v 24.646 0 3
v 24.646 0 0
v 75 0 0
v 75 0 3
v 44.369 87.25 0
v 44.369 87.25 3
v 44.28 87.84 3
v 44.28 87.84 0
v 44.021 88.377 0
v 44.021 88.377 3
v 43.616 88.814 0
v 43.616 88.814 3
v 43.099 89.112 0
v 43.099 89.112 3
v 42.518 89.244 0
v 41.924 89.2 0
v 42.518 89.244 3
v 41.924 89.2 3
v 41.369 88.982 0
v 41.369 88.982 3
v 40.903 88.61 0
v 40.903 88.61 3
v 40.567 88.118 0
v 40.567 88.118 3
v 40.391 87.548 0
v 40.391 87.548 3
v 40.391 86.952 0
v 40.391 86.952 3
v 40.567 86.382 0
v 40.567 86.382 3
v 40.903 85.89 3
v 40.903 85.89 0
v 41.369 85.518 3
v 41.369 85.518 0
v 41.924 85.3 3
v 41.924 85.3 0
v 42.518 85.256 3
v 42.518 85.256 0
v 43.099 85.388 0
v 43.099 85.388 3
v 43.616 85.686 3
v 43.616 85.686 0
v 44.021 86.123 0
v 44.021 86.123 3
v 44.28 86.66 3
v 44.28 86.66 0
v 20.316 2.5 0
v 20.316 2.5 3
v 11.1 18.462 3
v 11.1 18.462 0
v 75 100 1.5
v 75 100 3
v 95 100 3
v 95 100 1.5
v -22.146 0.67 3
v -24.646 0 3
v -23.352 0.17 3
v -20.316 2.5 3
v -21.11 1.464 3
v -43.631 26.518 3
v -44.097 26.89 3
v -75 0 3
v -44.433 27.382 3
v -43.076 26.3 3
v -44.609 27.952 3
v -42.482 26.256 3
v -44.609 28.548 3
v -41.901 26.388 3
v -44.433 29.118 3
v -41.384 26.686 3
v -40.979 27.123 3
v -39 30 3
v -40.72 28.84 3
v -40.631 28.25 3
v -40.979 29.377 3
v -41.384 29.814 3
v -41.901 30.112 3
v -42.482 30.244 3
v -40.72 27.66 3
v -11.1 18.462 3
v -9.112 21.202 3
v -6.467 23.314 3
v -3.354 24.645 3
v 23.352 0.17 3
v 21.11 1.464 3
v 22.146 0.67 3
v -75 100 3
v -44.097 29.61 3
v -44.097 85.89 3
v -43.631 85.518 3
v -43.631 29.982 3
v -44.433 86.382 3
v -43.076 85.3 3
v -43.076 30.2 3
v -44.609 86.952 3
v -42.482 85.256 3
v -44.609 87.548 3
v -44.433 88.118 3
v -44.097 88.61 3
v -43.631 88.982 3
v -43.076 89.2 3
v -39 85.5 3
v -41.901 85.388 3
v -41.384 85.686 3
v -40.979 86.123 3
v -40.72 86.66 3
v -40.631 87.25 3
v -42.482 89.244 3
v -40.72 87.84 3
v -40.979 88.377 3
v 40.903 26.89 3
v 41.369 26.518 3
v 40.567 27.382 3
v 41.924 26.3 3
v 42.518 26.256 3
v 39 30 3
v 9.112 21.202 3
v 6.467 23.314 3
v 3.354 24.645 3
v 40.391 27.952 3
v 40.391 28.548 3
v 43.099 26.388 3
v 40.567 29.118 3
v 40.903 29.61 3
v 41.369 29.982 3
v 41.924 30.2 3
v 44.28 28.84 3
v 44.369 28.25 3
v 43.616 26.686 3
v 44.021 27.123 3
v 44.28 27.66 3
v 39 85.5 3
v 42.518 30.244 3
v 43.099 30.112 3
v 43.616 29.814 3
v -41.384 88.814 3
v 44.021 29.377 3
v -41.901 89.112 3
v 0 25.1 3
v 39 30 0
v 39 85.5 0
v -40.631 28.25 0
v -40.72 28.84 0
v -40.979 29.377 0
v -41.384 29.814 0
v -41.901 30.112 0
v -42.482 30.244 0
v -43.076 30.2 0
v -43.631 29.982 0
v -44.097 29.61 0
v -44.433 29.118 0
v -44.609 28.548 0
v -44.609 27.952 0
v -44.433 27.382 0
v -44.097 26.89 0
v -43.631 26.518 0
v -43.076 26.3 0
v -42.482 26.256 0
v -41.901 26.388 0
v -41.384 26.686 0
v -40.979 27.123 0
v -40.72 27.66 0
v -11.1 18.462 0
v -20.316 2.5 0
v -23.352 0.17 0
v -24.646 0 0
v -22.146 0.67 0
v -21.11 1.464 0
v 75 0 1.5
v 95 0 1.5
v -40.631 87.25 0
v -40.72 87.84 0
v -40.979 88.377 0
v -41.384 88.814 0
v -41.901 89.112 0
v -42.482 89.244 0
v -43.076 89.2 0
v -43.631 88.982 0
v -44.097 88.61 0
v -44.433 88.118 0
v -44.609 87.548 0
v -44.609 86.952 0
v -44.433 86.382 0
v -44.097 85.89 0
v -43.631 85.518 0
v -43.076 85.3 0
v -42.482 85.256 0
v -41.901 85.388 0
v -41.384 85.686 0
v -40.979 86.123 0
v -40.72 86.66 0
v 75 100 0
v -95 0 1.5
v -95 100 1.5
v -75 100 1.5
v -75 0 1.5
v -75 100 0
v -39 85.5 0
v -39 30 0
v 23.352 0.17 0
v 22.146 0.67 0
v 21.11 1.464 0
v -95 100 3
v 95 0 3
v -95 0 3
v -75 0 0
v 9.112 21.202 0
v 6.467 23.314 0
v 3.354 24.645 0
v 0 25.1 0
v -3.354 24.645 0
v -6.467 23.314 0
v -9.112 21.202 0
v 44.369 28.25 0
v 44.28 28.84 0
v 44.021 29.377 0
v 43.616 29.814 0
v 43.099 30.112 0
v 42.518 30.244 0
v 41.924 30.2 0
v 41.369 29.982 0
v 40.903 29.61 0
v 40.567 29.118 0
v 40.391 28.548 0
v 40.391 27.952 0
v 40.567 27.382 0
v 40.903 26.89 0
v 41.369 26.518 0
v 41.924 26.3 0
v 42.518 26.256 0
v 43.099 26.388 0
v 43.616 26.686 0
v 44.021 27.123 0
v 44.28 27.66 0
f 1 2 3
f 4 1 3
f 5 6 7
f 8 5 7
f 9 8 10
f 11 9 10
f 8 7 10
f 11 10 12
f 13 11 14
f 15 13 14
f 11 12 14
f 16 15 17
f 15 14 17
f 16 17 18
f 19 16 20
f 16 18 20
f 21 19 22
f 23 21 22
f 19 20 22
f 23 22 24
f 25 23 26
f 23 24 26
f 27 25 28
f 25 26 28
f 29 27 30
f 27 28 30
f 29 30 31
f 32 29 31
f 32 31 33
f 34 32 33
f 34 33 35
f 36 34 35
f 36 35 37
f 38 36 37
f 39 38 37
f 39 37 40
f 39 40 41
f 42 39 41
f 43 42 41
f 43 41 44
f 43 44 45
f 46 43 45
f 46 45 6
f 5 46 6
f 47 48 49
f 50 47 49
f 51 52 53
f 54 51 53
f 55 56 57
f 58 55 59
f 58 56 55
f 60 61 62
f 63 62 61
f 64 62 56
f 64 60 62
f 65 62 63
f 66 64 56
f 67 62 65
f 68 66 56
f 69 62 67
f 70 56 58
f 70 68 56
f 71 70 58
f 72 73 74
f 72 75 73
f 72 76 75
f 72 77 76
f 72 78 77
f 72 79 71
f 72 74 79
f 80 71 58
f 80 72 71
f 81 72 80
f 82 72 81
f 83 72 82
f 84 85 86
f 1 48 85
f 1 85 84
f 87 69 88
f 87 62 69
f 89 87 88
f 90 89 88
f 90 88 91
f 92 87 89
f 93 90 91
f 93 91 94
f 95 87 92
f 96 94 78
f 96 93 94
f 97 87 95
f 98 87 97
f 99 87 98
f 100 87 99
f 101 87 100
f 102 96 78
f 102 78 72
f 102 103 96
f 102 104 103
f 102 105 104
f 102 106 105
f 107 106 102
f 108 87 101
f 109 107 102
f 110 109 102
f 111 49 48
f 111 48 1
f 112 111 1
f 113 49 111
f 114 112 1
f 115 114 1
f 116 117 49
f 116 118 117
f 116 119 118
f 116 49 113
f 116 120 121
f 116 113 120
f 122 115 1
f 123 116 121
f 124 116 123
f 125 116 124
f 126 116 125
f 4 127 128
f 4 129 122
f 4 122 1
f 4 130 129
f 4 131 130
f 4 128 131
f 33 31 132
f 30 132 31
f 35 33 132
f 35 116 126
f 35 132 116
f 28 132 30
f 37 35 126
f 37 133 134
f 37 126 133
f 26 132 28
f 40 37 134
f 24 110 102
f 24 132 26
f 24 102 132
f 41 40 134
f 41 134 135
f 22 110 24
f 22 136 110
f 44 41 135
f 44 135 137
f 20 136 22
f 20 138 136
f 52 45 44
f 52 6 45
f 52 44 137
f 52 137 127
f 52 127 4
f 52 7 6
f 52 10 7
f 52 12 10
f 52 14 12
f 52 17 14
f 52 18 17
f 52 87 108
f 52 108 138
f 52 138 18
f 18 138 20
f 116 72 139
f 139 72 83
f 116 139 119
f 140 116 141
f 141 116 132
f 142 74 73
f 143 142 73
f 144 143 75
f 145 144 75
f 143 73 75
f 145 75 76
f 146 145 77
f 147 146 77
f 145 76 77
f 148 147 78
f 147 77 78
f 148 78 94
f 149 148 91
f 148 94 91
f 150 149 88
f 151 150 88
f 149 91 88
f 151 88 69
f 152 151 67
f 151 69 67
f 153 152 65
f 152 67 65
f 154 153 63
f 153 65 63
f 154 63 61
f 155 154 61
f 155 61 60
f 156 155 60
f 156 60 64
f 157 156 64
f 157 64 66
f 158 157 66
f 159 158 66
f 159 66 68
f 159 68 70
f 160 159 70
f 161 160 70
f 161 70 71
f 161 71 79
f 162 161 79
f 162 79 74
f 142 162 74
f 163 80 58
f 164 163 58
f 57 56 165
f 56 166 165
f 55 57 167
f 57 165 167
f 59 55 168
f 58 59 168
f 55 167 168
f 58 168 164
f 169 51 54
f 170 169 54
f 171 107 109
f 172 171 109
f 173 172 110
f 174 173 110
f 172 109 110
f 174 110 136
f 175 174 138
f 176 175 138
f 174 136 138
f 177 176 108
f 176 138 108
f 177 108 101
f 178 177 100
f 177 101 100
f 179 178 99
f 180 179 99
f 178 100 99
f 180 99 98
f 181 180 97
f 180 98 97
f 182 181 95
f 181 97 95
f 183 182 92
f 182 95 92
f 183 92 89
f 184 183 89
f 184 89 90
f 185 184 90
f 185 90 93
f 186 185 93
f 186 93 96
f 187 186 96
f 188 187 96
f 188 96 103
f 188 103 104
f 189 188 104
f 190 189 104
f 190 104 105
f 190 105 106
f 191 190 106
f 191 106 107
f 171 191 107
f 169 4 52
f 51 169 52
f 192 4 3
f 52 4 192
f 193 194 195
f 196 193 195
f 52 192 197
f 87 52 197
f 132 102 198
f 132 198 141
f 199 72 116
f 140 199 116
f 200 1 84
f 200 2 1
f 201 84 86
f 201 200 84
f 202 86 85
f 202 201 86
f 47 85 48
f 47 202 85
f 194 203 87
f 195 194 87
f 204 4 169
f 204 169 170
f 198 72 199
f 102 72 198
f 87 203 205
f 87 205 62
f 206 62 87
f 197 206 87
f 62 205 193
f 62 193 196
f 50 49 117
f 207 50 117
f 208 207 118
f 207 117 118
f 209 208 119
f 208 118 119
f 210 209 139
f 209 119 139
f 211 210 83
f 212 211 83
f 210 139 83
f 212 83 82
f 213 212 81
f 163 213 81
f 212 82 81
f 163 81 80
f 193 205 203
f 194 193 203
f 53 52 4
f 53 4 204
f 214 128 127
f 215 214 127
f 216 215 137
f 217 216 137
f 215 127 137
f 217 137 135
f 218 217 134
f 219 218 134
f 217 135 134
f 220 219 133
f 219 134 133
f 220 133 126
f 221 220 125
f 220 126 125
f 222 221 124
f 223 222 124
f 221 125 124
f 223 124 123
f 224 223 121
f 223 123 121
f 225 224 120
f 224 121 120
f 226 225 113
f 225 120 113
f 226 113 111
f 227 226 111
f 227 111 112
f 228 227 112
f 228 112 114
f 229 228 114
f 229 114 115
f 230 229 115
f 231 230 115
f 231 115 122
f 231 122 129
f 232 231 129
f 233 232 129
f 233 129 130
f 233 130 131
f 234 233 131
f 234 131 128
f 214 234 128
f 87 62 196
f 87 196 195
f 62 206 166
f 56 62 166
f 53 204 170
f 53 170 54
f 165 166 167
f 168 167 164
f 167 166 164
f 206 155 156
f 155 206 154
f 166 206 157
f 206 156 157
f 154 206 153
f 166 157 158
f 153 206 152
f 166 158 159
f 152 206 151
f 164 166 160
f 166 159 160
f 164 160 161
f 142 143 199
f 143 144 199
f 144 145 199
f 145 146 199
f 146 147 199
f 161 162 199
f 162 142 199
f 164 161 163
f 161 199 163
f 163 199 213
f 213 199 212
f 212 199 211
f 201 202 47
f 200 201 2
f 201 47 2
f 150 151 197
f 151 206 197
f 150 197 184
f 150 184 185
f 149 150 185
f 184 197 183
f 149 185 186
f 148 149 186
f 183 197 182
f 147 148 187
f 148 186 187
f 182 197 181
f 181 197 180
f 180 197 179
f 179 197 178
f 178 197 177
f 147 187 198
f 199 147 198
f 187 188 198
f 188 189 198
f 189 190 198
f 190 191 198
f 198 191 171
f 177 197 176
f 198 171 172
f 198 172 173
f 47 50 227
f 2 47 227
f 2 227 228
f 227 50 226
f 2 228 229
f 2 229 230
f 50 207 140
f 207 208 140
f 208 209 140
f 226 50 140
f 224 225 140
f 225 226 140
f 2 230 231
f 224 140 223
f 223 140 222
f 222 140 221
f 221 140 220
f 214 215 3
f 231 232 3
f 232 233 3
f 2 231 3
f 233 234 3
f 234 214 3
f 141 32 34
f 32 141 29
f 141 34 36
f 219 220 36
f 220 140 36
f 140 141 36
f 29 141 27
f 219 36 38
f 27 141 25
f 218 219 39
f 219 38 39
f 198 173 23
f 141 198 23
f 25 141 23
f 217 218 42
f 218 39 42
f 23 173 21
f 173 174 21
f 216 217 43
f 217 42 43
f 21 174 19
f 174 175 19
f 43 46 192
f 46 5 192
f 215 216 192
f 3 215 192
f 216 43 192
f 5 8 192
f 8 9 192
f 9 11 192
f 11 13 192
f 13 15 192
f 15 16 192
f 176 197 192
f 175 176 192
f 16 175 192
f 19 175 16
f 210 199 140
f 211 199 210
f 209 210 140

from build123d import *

# Parameters (mm, degrees)
F1_DEPTH  = 3
F3_DEPTH  = 25
F4_R      = 5
F5_R      = 11.15
F5_R_2    = 2.65
F6_DEPTH  = 25
F7_W      = 78
F7_H      = 55.5
F7_R      = 2
F8_DEPTH  = 25
F9_R      = 8.15
F10_DEPTH = 25
F12_W     = 138.9529037597
F12_H     = 109.3872413095
F12_W_2   = 150.4097267888
F12_H_2   = 110.1016509688
F13_DEPTH = 25
F14_W     = 20
F14_H     = 100
F15_DEPTH = 1.5


with BuildPart() as f1:
    # F0 (on Top) → F1 (new body)
    with BuildSketch(Plane.XY):
        with BuildLine():
            Line((-197.8147600734, 20.7911690818), (-202.2340594865, 0))
            Line((-202.2340594865, 0), (216.0975214603, 0))
            Line((216.0975214603, 0), (209.2885731253, 20.7911690818))
            ThreePointArc((209.2885731253, 20.7911690818), (167.4870934164, 78.1154778874), (100, 100))
            Line((100, 100), (-100, 100))
            ThreePointArc((-100, 100), (-162.932039105, 77.7145961457), (-197.8147600734, 20.7911690818))
        make_face()
    extrude(amount=F1_DEPTH)

    # F2 (on face) → F3 (cut)
    with BuildSketch(Plane.XY.offset(3)):
        with BuildLine():
            ThreePointArc((1.5842979518, 0), (9.4530988092, 4.1693984068), (12.6, 12.5))
            ThreePointArc((12.6, 12.5), (12.2192388124, 15.5741182224), (11.0999678023, 18.4624420155))
            ThreePointArc((11.0999678023, 18.4624420155), (0, 25.1), (-11.0999678023, 18.4624420155))
            ThreePointArc((-11.0999678023, 18.4624420155), (-11.1999147641, 6.7274867453), (-1.5842979518, 0))
            Line((-1.5842979518, 0), (1.5842979518, 0))
        make_face()
        with BuildLine():
            ThreePointArc((11.0999678023, 18.4624420155), (12.2192388124, 15.5741182224), (12.6, 12.5))
            ThreePointArc((12.6, 12.5), (9.4530988092, 4.1693984068), (1.5842979518, 0))
            Line((1.5842979518, 0), (21.7592636698, 0))
            Line((21.7592636698, 0), (11.0999678023, 18.4624420155))
        make_face()
        with BuildLine():
            ThreePointArc((-1.5842979518, 0), (0, -0.1), (1.5842979518, 0))
            Line((1.5842979518, 0), (-1.5842979518, 0))
        make_face()
        with BuildLine():
            ThreePointArc((-1.5842979518, 0), (-11.1999147641, 6.7274867453), (-11.0999678023, 18.4624420155))
            Line((-11.0999678023, 18.4624420155), (-21.7592636698, 0))
            Line((-21.7592636698, 0), (-1.5842979518, 0))
        make_face()
    extrude(amount=-F3_DEPTH, mode=Mode.SUBTRACT)

    # F4
    f4_edges = [f1.edges().sort_by_distance(p)[0] for p in [
        (-21.759264, 0, 1.5),
        (21.759264, 0, 1.5),
    ]]
    fillet(f4_edges, radius=F4_R)

    # F5 (on face) → F6 (cut)
    with BuildSketch(Plane.XY.offset(3)):
        Polygon((-145, 38.9489291724), (-152.75, 34.4744645862), (-152.75, 25.5255354138), (-145, 21.0510708276), (-137.25, 25.5255354138), (-137.25, 34.4744645862), align=None)
        with Locations((-115, 30)):
            Circle(F5_R)
        with Locations((-115, 60)):
            Circle(F5_R_2)
        with Locations((-145, 60)):
            Circle(F5_R_2)
    extrude(amount=-F6_DEPTH, mode=Mode.SUBTRACT)

    # F7 (on face) → F8 (cut)
    with BuildSketch(Plane.XY.offset(3)):
        with Locations((0, 57.75)):
            Rectangle(F7_W, F7_H)
        with Locations((-42.6313167033, 28.25)):
            Circle(F7_R)
        with Locations((-42.6313167033, 87.25)):
            Circle(F7_R)
        with Locations((42.3686832967, 87.25)):
            Circle(F7_R)
        with Locations((42.3686832967, 28.25)):
            Circle(F7_R)
    extrude(amount=-F8_DEPTH, mode=Mode.SUBTRACT)

    # F9 (on face) → F10 (cut)
    with BuildSketch(Plane.XY.offset(3)):
        with Locations((115, 30)):
            Circle(F9_R)
    extrude(amount=-F10_DEPTH, mode=Mode.SUBTRACT)

    # F12 (on face) → F13 (cut)
    with BuildSketch(Plane.XY.offset(3)):
        with Locations((-144.4764518799, 54.6936206547)):
            Rectangle(F12_W, F12_H)
        with Locations((150.2048633944, 55.0508254844)):
            Rectangle(F12_W_2, F12_H_2)
    extrude(amount=-F13_DEPTH, mode=Mode.SUBTRACT)


with BuildPart() as f15:
    # F14 (on face) → F15 (new body)
    with BuildSketch(Plane.XY.offset(3)):
        with Locations((-85, 50)):
            Rectangle(F14_W, F14_H)
    extrude(amount=-F15_DEPTH)


with BuildPart() as f15b:
    # F14 (on face) → F15, piece 2 (new body)
    with BuildSketch(Plane.XY.offset(3)):
        with Locations((85, 50)):
            Rectangle(F14_W, F14_H)
    extrude(amount=-F15_DEPTH)


solid = Compound([f1.part, f15.part, f15b.part])
